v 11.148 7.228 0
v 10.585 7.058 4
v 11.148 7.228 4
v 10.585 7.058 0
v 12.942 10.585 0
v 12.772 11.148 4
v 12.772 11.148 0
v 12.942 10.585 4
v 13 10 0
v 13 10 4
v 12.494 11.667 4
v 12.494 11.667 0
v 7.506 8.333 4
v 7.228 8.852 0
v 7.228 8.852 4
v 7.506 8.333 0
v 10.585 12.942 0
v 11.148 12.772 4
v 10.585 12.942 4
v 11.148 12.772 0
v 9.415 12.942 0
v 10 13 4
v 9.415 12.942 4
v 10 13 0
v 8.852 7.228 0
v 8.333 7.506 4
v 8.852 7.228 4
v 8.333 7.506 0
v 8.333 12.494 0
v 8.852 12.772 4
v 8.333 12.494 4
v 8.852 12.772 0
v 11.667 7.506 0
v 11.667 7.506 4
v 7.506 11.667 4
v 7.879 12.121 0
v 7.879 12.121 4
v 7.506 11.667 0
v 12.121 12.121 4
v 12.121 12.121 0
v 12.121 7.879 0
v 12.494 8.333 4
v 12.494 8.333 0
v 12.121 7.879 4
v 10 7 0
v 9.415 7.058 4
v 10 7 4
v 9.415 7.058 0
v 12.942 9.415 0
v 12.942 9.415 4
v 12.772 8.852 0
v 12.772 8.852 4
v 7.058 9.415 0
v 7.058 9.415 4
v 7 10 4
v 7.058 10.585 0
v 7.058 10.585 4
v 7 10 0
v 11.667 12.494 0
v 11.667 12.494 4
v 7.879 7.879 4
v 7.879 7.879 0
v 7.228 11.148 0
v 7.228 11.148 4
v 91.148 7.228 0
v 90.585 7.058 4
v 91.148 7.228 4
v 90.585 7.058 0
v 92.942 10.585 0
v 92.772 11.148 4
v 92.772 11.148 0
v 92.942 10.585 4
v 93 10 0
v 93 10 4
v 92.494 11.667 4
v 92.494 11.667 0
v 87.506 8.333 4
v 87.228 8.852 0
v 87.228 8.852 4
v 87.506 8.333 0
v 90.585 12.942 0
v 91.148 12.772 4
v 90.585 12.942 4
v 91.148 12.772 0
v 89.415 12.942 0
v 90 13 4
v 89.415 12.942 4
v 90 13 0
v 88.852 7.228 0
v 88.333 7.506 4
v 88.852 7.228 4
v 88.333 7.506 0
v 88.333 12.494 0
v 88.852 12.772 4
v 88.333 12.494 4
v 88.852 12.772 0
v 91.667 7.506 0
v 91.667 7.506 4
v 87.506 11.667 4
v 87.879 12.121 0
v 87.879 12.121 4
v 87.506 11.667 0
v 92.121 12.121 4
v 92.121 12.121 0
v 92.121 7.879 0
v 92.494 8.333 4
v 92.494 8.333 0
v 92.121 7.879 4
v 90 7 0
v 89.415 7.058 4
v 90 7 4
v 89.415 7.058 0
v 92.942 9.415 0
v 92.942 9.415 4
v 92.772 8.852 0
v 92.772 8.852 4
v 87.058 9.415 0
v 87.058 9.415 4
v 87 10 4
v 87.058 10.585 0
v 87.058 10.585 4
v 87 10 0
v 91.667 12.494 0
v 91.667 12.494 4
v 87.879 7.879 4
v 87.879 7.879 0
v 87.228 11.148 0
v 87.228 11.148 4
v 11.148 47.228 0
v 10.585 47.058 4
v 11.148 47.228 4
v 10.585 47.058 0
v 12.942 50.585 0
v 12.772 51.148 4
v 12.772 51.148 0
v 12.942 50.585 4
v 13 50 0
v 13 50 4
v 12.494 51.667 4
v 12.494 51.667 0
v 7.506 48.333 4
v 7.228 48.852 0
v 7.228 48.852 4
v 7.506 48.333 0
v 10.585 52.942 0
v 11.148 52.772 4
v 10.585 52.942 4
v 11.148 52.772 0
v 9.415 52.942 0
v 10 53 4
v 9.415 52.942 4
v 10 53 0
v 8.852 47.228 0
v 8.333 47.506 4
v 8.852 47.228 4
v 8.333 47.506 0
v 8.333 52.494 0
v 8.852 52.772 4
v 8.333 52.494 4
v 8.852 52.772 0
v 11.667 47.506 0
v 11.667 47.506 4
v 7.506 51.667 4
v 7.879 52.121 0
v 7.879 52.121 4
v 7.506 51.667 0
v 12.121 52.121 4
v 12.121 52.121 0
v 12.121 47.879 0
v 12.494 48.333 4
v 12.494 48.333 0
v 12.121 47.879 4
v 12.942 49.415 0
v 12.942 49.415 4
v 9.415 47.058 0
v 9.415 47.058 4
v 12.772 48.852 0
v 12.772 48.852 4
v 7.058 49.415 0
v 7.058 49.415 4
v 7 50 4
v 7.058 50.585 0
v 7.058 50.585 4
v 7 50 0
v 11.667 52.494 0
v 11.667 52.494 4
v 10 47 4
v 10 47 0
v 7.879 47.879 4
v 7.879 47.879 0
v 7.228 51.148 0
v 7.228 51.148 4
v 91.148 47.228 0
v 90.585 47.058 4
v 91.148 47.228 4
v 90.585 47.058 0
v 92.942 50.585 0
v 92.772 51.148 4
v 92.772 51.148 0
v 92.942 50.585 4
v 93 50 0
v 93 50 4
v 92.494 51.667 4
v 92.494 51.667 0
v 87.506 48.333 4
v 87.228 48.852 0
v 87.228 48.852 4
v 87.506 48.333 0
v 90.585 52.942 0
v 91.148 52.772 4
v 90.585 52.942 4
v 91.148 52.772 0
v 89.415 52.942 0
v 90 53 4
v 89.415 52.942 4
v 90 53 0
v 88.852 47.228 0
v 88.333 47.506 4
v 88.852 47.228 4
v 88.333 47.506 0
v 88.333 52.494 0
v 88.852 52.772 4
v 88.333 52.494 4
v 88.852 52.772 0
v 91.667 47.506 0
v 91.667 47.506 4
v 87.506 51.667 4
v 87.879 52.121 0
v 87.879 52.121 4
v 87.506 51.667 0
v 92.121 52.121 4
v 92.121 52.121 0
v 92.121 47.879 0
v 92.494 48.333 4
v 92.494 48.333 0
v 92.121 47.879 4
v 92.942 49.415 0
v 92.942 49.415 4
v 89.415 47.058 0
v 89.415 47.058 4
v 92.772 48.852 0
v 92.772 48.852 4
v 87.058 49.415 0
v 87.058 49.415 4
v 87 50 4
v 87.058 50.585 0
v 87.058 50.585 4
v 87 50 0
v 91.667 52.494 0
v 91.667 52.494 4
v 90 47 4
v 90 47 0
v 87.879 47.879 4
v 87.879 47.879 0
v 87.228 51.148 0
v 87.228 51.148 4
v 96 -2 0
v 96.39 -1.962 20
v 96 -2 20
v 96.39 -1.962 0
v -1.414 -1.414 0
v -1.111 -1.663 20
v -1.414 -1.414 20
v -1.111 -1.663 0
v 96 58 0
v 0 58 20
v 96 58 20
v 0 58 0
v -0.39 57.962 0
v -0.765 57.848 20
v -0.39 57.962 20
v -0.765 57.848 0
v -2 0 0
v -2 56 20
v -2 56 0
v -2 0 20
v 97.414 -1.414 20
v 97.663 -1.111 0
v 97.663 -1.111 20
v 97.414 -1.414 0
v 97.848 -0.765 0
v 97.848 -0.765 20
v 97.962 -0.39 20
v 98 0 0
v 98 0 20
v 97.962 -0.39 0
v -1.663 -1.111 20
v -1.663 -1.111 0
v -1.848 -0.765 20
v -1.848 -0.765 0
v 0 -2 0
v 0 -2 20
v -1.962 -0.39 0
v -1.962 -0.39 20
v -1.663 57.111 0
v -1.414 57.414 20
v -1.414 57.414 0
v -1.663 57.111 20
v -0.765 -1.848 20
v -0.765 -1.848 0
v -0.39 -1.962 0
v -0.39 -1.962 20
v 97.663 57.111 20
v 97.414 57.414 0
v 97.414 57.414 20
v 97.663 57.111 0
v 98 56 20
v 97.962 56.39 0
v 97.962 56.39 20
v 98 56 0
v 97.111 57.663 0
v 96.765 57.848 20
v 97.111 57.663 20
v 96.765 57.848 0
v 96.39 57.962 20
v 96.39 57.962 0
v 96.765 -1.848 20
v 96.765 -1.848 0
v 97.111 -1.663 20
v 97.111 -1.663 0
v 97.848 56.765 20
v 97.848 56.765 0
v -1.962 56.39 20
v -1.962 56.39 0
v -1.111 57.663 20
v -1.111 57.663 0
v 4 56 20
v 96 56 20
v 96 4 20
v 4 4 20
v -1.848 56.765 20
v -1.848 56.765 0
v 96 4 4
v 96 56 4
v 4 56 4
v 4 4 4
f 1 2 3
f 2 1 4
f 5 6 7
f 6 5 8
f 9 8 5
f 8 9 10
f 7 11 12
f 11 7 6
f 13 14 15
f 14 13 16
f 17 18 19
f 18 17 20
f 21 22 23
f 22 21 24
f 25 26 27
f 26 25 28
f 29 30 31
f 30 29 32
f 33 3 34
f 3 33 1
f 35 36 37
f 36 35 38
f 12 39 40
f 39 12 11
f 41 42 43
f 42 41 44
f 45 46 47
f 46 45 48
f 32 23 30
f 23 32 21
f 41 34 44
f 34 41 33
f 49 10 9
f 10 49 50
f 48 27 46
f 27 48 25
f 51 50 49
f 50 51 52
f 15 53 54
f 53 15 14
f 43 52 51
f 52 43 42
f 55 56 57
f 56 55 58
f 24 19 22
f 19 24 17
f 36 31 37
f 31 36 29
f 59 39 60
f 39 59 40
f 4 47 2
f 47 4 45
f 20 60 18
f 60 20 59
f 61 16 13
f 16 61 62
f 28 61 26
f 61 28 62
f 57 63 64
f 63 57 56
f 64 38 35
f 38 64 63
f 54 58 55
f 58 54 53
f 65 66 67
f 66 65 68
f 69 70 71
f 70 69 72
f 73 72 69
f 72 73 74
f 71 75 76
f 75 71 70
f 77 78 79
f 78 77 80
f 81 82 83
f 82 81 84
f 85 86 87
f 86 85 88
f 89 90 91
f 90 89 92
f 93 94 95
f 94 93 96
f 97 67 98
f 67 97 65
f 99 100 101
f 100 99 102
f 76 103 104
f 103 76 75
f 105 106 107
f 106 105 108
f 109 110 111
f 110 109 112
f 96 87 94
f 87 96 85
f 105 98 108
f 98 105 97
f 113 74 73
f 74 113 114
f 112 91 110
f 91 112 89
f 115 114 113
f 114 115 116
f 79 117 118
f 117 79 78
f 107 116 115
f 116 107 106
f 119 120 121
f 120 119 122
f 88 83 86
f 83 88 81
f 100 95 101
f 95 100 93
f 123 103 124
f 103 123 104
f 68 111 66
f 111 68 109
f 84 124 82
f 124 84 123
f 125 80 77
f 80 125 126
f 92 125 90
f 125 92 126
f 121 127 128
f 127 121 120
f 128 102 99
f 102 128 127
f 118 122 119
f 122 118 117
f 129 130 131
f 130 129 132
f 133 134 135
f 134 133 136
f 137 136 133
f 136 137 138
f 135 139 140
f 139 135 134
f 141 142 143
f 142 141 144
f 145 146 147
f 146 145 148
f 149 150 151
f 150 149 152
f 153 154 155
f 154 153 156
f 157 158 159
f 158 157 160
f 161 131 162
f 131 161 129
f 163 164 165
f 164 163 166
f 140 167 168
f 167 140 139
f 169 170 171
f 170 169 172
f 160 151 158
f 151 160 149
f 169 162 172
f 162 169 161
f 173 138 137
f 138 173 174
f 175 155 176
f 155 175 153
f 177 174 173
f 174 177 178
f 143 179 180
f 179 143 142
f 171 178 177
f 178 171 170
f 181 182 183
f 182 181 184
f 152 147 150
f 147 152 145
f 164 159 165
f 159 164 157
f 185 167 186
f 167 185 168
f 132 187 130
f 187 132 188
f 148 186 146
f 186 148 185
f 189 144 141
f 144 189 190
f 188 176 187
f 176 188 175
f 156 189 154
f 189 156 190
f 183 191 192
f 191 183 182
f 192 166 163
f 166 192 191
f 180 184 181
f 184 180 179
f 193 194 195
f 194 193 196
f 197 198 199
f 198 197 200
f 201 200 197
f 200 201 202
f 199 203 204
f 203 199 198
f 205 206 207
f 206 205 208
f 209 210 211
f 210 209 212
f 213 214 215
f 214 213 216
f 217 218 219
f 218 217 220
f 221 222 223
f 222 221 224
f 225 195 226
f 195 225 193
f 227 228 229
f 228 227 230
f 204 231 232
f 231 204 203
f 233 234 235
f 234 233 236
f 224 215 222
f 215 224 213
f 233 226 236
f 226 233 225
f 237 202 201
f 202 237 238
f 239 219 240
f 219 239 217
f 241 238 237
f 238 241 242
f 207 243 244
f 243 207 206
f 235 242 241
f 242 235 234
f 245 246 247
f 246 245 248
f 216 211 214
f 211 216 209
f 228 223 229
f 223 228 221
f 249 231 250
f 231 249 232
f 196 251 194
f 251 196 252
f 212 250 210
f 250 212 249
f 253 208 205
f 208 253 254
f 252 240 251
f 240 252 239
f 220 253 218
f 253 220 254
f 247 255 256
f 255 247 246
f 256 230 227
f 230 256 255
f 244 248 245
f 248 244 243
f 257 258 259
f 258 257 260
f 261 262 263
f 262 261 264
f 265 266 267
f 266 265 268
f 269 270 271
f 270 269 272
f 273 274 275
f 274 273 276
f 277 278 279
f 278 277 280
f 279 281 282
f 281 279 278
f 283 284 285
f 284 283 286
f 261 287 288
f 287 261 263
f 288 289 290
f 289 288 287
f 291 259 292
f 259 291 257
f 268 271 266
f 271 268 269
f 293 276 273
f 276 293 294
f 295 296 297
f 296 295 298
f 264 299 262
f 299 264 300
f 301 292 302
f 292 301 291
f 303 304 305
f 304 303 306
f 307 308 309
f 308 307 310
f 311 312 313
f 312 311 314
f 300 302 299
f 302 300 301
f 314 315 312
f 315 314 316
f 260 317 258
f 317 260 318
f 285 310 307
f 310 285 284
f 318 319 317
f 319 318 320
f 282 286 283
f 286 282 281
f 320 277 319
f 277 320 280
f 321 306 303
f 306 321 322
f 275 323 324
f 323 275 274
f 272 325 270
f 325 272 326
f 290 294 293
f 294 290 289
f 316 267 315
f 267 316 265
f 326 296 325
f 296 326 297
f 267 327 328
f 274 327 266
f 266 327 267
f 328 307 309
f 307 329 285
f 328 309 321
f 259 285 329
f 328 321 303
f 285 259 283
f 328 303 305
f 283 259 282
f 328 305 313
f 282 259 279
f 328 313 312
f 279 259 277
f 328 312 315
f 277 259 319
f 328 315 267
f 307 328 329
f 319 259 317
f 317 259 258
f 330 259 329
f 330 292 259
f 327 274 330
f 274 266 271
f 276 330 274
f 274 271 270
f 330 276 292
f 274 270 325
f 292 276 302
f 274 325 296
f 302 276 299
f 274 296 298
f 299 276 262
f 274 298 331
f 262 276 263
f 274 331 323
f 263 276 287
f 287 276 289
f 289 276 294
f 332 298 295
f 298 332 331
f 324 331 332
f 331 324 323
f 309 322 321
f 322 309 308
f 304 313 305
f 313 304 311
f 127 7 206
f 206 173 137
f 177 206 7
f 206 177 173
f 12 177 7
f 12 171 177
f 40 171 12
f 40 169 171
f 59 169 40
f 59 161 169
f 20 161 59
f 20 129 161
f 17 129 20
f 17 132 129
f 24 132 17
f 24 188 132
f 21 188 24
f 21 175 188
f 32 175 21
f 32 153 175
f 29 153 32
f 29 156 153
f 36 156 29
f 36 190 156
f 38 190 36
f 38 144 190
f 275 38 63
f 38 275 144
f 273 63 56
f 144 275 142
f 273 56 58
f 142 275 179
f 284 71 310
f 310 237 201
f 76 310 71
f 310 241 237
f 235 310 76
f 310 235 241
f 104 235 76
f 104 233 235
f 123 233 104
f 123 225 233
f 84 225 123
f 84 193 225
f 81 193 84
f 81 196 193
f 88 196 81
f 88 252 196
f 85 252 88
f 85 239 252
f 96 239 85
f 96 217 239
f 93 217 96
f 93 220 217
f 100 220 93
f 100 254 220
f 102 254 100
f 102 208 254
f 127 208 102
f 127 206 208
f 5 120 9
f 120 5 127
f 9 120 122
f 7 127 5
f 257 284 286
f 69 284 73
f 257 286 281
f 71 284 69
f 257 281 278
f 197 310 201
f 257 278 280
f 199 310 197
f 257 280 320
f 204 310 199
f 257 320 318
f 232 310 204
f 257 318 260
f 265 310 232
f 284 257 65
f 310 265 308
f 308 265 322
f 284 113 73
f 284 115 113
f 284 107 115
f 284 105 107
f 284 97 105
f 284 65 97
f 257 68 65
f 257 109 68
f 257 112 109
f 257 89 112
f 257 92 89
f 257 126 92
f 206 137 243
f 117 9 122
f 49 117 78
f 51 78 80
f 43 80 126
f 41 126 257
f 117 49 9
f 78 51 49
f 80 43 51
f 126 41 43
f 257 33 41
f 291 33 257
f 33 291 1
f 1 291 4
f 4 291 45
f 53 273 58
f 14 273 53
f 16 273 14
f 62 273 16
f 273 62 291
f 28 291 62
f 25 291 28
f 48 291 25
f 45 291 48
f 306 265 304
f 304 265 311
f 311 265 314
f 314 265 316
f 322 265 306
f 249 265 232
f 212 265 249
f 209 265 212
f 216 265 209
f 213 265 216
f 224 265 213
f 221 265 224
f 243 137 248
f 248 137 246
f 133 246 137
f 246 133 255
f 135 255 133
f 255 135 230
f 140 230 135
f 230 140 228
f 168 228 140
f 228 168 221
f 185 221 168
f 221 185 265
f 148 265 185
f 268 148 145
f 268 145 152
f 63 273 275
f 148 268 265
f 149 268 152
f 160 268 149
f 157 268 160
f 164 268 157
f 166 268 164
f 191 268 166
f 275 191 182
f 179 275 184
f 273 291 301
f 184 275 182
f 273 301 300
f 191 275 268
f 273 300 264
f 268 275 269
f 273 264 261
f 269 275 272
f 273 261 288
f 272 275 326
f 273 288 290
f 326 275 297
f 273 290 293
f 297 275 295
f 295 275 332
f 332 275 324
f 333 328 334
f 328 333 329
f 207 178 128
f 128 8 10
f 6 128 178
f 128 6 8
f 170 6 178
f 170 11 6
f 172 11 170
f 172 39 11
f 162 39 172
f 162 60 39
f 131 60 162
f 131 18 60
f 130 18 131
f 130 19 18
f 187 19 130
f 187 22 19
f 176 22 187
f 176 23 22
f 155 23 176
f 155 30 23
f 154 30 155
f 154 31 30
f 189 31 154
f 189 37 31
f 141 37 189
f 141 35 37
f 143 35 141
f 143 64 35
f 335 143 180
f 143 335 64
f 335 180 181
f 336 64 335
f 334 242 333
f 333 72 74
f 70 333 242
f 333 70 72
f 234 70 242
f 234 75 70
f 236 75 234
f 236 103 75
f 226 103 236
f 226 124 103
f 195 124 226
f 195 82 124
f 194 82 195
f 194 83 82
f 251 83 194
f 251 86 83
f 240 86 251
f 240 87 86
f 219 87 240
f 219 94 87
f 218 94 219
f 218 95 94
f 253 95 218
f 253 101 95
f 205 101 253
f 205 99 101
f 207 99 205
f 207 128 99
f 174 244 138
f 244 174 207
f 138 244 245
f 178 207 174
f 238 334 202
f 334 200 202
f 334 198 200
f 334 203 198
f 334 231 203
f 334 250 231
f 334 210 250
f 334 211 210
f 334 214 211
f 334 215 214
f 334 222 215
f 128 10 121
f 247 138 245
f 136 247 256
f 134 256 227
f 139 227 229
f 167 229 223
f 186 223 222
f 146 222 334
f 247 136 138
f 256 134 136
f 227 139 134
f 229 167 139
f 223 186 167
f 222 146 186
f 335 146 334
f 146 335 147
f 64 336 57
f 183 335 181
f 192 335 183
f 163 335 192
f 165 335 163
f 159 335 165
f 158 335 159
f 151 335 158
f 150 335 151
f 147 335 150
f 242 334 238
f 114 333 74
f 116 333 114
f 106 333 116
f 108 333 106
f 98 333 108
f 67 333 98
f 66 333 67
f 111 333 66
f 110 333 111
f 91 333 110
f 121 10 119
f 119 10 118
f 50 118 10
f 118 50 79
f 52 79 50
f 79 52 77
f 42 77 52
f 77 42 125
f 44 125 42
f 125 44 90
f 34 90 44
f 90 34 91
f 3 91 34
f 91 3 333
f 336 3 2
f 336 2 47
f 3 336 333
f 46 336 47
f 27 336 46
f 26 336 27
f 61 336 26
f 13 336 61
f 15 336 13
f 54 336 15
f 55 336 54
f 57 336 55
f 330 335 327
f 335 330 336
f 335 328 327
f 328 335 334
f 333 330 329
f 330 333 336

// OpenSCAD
// scad/base_part.scad
// Parametric mounting bracket.
// All caps variables are injected via -D flags from openscad_runner.py.
// Do not hardcode dimensions here — edit scad/base_part_params.json instead.

// ── Parameters (defaults match scad/base_part_params.json) ────────────────
LENGTH                 = 100.0;
WIDTH                  = 60.0;
HEIGHT                 = 20.0;
WALL_THICKNESS         = 4.0;
FILLET_RADIUS          = 2.0;
MOUNTING_HOLE_DIAMETER = 6.0;
MOUNTING_HOLE_INSET    = 10.0;

// ── Derived values ─────────────────────────────────────────────────────────
hole_r   = MOUNTING_HOLE_DIAMETER / 2;
fn_curve = 32;  // cylinder facets — increase for smoother export

// ── Main body ──────────────────────────────────────────────────────────────
module body() {
    minkowski() {
        cube([
            LENGTH - 2 * FILLET_RADIUS,
            WIDTH  - 2 * FILLET_RADIUS,
            HEIGHT - FILLET_RADIUS
        ]);
        cylinder(r=FILLET_RADIUS, h=FILLET_RADIUS, $fn=fn_curve);
    }
}

// ── Mounting holes (4 corners) ─────────────────────────────────────────────
module mounting_holes() {
    inset = MOUNTING_HOLE_INSET;
    positions = [
        [inset,          inset         ],
        [LENGTH - inset, inset         ],
        [inset,          WIDTH - inset ],
        [LENGTH - inset, WIDTH - inset ],
    ];
    for (pos = positions) {
        translate([pos[0], pos[1], -1])
            cylinder(r=hole_r, h=HEIGHT + 2, $fn=fn_curve);
    }
}

// ── Hollowed interior (shell thickness = WALL_THICKNESS) ───────────────────
module hollow() {
    translate([WALL_THICKNESS, WALL_THICKNESS, WALL_THICKNESS])
        cube([
            LENGTH - 2 * WALL_THICKNESS,
            WIDTH  - 2 * WALL_THICKNESS,
            HEIGHT
        ]);
}

// ── Assembly ───────────────────────────────────────────────────────────────
difference() {
    body();
    hollow();
    mounting_holes();
}
